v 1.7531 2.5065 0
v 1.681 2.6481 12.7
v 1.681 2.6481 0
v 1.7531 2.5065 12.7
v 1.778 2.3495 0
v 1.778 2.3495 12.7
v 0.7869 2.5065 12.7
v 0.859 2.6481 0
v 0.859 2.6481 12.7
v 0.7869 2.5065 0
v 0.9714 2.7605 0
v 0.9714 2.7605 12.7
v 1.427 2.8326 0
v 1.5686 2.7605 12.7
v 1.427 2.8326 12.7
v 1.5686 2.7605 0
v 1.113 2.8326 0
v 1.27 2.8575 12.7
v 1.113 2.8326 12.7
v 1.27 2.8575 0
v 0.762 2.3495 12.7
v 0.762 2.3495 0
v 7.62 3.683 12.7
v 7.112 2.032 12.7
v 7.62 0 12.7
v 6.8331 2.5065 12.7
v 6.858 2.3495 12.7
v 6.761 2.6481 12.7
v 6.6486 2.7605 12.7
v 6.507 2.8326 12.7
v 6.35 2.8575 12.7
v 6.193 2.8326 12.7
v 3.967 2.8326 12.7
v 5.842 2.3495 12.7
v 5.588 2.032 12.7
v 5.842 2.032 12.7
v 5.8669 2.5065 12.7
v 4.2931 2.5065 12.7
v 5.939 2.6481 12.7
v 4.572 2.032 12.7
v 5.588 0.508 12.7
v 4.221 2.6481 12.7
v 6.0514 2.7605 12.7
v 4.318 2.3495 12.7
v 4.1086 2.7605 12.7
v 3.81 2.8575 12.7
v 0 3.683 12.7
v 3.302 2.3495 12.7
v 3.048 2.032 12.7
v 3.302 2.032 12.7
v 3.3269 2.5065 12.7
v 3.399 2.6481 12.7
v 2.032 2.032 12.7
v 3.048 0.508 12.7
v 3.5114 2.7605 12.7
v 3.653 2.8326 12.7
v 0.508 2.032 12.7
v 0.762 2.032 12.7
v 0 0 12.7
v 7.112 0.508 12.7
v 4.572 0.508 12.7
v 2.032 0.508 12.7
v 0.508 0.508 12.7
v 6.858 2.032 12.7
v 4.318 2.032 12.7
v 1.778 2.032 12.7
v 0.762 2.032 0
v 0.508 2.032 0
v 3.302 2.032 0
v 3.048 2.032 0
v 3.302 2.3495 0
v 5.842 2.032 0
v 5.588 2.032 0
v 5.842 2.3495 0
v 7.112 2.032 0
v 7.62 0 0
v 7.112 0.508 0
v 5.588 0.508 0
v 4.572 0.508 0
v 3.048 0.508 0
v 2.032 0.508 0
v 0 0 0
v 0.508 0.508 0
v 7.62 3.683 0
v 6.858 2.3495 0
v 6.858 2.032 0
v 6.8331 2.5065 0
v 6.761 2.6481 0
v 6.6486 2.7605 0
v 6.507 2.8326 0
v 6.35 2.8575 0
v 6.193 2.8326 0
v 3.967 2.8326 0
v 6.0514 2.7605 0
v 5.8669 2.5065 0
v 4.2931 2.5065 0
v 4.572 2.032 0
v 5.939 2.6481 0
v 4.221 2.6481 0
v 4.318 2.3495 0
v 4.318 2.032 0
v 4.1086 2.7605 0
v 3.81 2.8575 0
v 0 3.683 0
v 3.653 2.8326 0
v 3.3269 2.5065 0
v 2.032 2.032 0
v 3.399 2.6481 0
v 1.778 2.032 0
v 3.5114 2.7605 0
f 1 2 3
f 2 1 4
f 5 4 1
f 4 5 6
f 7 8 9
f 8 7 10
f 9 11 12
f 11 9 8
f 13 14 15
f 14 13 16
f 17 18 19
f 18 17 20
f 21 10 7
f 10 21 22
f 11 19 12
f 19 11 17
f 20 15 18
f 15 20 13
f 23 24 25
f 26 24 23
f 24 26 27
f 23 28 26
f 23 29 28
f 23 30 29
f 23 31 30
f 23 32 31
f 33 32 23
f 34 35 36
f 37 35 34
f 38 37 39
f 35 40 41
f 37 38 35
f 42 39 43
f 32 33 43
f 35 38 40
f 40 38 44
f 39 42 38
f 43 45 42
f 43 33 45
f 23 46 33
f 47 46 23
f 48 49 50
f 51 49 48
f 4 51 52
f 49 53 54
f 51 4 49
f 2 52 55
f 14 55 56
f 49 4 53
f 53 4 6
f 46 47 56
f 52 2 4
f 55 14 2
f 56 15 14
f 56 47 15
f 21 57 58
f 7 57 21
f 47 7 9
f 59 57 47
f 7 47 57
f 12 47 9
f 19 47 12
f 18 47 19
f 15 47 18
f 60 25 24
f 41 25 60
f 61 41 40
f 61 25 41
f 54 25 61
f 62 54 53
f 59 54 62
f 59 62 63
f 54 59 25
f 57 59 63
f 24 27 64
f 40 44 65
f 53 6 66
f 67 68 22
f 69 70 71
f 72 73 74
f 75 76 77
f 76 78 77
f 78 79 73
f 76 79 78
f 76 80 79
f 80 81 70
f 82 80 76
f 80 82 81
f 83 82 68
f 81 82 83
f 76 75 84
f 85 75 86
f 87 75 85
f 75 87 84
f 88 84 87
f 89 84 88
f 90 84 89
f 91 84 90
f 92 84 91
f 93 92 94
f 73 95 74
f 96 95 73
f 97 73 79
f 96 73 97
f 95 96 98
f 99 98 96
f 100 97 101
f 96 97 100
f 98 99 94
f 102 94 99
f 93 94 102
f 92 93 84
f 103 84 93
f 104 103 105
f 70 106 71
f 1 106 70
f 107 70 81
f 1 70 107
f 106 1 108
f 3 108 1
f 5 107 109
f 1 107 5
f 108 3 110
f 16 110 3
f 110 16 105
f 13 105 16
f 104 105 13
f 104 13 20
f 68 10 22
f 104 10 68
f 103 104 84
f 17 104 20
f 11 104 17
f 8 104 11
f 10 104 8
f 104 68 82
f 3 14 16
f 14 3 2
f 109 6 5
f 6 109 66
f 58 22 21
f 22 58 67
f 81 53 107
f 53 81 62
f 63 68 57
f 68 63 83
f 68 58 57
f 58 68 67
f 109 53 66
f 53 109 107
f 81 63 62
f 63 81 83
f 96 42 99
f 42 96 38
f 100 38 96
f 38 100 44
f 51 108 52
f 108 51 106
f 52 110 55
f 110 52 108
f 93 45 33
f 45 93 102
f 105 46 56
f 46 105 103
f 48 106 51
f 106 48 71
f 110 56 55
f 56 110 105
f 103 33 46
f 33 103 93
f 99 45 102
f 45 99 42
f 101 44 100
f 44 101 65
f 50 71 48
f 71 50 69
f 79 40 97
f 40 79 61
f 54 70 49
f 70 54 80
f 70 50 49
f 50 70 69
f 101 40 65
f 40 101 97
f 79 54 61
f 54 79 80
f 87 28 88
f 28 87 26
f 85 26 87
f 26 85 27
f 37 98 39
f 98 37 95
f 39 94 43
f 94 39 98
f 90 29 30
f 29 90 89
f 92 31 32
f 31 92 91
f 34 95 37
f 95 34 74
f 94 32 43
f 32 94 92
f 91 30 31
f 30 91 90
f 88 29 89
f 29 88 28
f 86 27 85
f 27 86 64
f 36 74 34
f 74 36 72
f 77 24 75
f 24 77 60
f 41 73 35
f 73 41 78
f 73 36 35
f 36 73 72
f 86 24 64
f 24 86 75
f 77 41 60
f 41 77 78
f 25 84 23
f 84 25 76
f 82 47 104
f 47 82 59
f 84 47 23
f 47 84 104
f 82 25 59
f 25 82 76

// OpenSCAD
units = 25.4;

num_headers = 3;
width_in_units = 0.1;
height_in_units = 0.5;
wire_diameter_in_units = 0.04;
inner_width_in_units = 0.06;
wire_jut_in_units = 0.015;
reinforcement_in_units = 0.02;

width = width_in_units * units;
height = height_in_units * units;
inner_width = inner_width_in_units * units;
wire_diameter = wire_diameter_in_units * units;
wire_jut = wire_jut_in_units * units;
reinforcement = reinforcement_in_units * units;

module header_pin(
    width = 0.1 * units,
    height = 0.5 * units,
    inner_width = 0.05 * units,
    wire_diameter = 1,
    wire_jut = 0.02 * units,
    $fn = 20) {
  union() {
    translate([(width - inner_width) / 2, (width-inner_width) / 2, 0])
      cube([inner_width, inner_width, height]);
    translate([width / 2, (width + inner_width + wire_diameter - wire_jut) / 2, 0])
      union() {
        cylinder(r = wire_diameter / 2, h = height);
        translate([-wire_diameter / 2, -wire_diameter / 2 - 0.1, 0])
          cube([wire_diameter, wire_diameter / 2 + 0.1, height]);
      }
    *translate([width / 2, (width + inner_width) / 2, 2 * wire_diameter])
      rotate([-90, 0, 0])
        cylinder(r = wire_diameter / 2, h = (width - inner_width + wire_diameter) / 2);
  }
}

module header_row(
    width = 0.5 * units,
    height = 0.5 * units,
    inner_width = 0.05 * units,
    wire_diameter = 1,
    reinforcement = 0.02 * units,
    wire_jut = 0.02 * units,
    n = 3) {
  difference() {
    cube([width * n, width + wire_diameter + reinforcement - wire_jut, height]);
    for(i = [0:n-1])
      translate([width * i, 0, 0]) {
        header_pin(
            width,
            height,
            inner_width,
            wire_diameter,
            wire_jut);
       }
  }
}

header_row(width, height, inner_width, wire_diameter, reinforcement, wire_jut, num_headers);
